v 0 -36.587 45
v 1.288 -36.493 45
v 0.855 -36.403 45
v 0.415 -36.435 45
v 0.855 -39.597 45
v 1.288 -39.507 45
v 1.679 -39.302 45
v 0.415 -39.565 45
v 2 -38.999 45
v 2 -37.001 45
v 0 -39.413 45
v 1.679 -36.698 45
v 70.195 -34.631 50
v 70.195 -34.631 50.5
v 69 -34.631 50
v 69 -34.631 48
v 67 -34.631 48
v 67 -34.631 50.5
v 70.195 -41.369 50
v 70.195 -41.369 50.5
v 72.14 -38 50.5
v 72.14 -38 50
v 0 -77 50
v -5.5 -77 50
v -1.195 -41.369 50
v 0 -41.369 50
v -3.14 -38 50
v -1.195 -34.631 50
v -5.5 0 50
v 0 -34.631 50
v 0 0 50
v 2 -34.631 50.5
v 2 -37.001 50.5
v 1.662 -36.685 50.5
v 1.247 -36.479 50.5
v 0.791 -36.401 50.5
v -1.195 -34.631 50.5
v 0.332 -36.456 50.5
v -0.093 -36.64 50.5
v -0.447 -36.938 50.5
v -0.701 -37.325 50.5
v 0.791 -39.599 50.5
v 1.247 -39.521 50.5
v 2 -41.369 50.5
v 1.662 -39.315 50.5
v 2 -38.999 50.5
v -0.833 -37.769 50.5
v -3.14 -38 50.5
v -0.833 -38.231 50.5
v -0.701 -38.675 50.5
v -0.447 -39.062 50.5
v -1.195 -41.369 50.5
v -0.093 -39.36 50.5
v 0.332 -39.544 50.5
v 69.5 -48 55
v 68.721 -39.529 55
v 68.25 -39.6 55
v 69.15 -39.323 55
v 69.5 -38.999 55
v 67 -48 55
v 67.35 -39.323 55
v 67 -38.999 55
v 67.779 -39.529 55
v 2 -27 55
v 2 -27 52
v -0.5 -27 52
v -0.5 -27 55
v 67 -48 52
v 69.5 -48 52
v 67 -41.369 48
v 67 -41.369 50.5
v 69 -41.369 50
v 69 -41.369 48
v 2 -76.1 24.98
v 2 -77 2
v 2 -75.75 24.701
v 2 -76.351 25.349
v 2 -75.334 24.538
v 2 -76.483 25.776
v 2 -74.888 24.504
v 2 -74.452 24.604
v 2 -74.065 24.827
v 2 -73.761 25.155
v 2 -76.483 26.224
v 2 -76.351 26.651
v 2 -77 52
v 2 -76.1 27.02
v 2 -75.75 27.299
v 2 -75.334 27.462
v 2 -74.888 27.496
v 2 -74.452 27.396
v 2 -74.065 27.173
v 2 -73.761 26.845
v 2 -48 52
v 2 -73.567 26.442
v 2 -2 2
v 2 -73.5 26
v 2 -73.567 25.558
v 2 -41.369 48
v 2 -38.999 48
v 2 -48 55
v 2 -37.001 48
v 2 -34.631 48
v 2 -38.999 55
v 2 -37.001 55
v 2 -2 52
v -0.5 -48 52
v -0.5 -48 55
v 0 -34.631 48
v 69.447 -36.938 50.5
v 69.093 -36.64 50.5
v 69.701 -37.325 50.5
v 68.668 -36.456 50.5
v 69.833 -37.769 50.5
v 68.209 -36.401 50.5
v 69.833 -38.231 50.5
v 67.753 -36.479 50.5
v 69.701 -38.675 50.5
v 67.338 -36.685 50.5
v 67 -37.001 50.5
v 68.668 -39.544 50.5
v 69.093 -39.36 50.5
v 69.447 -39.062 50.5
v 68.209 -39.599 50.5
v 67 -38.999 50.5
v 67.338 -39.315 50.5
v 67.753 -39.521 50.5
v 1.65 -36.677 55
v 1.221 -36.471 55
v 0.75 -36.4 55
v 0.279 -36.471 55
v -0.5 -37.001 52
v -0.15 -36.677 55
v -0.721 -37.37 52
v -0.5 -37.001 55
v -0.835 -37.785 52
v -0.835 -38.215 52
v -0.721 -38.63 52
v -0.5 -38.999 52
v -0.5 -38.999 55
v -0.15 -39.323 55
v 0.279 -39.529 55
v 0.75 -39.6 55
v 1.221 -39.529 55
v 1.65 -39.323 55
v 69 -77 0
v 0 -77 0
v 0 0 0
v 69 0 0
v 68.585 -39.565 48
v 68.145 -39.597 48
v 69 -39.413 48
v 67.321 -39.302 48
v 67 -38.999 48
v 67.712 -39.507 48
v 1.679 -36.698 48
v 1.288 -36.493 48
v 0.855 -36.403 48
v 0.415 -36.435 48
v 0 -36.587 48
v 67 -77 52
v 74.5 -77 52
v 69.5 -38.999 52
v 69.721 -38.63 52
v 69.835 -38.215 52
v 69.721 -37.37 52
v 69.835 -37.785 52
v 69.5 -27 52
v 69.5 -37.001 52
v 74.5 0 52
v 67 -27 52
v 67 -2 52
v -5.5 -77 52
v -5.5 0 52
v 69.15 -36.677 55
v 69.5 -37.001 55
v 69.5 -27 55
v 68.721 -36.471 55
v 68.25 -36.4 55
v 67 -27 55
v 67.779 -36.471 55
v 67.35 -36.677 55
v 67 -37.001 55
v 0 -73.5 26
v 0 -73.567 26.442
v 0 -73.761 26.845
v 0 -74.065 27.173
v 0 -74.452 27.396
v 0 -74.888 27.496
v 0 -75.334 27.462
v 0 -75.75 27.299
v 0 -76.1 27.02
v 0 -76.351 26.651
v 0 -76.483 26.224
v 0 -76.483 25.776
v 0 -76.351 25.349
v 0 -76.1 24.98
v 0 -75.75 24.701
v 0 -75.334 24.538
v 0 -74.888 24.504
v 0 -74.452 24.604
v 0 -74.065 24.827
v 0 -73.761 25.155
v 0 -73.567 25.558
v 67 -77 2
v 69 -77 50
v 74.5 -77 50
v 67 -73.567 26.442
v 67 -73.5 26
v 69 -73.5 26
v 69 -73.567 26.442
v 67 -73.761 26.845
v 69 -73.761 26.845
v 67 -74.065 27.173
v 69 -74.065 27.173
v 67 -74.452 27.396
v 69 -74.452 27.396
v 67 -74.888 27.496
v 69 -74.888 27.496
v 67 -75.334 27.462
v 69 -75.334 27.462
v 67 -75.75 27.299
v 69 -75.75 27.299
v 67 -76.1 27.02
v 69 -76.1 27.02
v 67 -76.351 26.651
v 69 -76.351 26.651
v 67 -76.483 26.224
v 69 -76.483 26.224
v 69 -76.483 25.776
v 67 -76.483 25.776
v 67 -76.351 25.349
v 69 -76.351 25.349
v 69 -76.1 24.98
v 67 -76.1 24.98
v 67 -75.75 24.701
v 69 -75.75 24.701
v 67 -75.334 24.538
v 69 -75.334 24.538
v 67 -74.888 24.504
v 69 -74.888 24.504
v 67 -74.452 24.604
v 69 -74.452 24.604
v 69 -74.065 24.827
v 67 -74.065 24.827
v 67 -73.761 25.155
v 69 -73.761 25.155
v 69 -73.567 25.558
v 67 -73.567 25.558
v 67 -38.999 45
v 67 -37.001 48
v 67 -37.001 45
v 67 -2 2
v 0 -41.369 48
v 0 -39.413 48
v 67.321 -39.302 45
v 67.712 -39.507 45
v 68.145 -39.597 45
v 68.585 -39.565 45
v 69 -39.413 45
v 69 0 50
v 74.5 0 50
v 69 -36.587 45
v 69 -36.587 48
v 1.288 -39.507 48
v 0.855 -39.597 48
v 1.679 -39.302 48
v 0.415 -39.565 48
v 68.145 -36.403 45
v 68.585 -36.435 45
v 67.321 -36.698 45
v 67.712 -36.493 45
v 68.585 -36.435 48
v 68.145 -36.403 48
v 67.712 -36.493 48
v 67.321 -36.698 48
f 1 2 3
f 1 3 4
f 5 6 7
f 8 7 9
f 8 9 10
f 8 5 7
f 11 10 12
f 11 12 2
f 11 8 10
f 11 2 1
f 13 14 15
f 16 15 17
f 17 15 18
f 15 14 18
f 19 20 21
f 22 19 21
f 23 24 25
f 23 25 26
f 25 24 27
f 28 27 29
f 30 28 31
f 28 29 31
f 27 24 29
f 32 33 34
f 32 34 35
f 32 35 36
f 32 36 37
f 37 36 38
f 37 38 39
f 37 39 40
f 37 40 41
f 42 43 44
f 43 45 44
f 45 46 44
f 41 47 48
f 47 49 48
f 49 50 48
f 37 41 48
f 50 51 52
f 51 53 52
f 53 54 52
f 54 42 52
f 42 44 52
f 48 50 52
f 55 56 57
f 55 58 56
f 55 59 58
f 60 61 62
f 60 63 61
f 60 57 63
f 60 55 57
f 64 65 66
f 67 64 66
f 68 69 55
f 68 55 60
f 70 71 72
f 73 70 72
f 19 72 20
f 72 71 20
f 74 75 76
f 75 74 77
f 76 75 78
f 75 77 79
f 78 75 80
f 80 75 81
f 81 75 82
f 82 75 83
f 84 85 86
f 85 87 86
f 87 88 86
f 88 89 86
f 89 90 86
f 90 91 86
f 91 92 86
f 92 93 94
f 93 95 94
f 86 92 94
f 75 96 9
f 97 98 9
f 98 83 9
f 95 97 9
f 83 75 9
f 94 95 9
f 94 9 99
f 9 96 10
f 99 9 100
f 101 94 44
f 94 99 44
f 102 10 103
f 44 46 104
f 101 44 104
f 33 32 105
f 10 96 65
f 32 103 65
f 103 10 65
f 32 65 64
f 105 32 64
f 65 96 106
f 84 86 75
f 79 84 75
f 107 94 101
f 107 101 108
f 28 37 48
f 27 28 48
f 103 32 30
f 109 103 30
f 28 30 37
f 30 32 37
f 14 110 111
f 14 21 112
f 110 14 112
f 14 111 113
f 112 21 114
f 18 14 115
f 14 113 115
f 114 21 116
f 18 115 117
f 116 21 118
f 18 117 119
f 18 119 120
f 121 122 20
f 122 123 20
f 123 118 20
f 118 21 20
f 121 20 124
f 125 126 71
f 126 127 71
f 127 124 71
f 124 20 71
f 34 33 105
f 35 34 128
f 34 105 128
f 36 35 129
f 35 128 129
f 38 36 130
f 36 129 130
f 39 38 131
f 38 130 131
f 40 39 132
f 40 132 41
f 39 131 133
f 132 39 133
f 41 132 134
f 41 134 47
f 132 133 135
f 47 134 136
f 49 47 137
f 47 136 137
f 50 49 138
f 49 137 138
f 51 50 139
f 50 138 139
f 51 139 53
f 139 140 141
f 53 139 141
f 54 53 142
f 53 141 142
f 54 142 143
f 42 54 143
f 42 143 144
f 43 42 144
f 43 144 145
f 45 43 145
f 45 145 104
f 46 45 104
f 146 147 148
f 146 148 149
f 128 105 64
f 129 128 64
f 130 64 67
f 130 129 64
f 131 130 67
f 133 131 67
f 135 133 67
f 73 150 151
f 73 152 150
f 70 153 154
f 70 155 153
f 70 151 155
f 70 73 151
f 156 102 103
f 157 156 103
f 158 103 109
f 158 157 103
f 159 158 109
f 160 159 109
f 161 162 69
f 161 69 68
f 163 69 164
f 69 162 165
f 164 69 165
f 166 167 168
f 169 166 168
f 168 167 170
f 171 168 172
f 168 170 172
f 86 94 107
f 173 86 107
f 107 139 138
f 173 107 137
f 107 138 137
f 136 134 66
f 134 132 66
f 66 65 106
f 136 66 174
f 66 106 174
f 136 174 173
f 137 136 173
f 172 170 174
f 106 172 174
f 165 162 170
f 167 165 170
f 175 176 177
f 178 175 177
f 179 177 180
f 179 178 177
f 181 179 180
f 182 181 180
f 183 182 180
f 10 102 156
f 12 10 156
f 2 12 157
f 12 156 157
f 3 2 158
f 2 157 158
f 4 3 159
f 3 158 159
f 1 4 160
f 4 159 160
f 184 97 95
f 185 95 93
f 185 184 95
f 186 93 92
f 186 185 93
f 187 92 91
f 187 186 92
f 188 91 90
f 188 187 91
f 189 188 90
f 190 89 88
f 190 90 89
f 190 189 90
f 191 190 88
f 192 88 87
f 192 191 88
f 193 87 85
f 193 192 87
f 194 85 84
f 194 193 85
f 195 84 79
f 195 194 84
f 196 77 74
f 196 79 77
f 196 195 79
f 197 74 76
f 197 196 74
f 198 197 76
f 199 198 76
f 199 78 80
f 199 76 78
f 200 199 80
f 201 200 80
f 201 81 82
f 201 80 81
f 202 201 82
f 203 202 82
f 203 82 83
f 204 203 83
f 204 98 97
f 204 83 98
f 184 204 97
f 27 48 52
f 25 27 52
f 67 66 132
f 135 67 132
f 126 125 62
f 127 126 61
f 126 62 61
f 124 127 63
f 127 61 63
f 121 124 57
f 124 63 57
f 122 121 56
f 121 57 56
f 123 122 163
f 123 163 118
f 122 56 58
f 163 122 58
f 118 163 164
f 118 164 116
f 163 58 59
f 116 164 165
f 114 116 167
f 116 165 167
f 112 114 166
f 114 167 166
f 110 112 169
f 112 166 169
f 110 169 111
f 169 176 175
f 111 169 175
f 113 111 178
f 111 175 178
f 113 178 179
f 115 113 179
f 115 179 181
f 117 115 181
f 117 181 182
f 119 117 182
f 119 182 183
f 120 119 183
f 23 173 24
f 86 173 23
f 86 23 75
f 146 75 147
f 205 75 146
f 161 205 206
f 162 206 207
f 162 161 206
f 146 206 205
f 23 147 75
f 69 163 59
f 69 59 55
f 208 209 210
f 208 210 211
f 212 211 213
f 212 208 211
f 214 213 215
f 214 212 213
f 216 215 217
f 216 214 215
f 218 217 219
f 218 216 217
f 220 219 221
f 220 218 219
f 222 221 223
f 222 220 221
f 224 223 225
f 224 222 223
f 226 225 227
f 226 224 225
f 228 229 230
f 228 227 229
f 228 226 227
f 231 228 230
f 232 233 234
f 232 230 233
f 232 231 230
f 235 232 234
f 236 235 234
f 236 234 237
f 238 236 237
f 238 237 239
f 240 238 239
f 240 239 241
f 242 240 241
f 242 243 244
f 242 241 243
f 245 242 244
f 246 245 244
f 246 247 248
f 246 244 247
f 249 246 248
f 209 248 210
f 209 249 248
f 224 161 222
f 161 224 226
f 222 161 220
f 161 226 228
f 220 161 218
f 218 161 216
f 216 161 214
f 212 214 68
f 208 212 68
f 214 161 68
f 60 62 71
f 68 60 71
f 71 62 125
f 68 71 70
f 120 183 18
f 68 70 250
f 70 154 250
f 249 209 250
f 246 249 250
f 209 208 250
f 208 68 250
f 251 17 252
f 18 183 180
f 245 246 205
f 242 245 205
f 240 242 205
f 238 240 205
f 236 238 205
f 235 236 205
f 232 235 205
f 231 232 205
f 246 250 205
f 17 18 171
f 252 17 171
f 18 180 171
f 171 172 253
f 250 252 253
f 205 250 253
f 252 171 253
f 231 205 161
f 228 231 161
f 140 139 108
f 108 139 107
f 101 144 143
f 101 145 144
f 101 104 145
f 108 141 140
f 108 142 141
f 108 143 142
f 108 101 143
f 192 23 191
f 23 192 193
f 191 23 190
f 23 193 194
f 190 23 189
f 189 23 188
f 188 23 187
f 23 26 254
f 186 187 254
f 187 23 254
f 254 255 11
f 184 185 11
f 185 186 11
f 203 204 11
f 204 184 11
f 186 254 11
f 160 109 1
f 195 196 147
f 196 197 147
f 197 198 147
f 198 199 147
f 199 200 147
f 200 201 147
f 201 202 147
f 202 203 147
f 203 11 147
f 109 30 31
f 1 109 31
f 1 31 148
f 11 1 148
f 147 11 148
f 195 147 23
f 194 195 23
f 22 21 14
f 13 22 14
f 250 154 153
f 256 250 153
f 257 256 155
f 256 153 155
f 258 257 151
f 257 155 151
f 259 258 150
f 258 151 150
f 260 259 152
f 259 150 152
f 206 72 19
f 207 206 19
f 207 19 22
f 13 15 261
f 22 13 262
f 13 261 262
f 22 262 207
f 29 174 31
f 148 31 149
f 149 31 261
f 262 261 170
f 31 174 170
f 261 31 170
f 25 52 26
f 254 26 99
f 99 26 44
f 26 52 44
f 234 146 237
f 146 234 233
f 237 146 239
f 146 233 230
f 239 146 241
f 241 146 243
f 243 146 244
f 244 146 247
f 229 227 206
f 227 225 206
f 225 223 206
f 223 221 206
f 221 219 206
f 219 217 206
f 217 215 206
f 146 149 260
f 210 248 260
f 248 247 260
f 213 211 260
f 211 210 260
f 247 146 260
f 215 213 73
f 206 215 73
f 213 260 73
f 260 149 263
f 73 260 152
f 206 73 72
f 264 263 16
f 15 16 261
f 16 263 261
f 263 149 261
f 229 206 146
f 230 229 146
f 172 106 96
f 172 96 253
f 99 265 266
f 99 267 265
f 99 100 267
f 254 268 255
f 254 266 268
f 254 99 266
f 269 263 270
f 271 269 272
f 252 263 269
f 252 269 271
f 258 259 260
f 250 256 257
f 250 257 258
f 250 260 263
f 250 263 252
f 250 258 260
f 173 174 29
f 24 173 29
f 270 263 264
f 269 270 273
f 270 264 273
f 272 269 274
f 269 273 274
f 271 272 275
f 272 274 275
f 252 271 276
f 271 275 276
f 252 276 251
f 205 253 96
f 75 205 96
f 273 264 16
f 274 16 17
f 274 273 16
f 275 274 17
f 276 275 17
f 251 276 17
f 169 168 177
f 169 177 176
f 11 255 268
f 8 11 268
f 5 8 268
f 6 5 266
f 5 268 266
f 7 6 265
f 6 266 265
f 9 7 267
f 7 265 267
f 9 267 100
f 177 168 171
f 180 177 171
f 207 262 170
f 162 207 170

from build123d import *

# Parameters (mm, degrees)
PAD_DEPTH         = 77
SKETCH001_W       = 69
SKETCH001_H       = 52
PAD001_DEPTH      = 2
SKETCH002_R       = 1.5
POCKET_DEPTH      = 5.501
POCKET_DEPTH_BACK = -74.501
SKETCH003_W       = 2.5
SKETCH003_H       = 21
PAD002_DEPTH      = 3
SKETCH004_R       = 1.6
POCKET001_DEPTH   = 10
POCKET002_DEPTH   = 2.5


with BuildPart() as part:
    # Sketch → Pad (new body)
    with BuildSketch(Plane.XZ):
        Polygon((0, 0), (69, 0), (69, 50), (74.5, 50), (74.5, 52), (67, 52), (67, 2), (2, 2), (2, 52), (-5.5, 52), (-5.5, 50), (0, 50), align=None)
    extrude(amount=PAD_DEPTH)

    # Sketch001 → Pad001 (join)
    with BuildSketch(Plane.XZ):
        with Locations((34.5, 26)):
            Rectangle(SKETCH001_W, SKETCH001_H)
    extrude(amount=PAD001_DEPTH)

    # Sketch002 → Pocket (cut, two sides)
    with BuildSketch(Plane.YZ) as pocket_sk:
        with Locations((-75, 26)):
            Circle(SKETCH002_R)
    extrude(amount=-POCKET_DEPTH, mode=Mode.SUBTRACT)
    extrude(pocket_sk.sketch, amount=-POCKET_DEPTH_BACK, mode=Mode.SUBTRACT)

    # Sketch003 (on Face8 of Pocket) → Pad002 (join)
    with BuildSketch(Plane(origin=(0, 0, 52), x_dir=(-1, 0, 0), z_dir=(0, 0, 1))):
        with Locations((-68.25, 37.5)):
            Rectangle(SKETCH003_W, SKETCH003_H)
        with Locations((-0.75, 37.5)):
            Rectangle(SKETCH003_W, SKETCH003_H)
    extrude(amount=PAD002_DEPTH)

    # Sketch004 (on Face21 of Pad002) → Pocket001 (cut)
    with BuildSketch(Plane(origin=(0, 0, 55), x_dir=(-1, 0, 0), z_dir=(0, 0, 1))):
        with Locations((-68.25, 38)):
            Circle(SKETCH004_R)
        with Locations((-0.75, 38)):
            Circle(SKETCH004_R)
    extrude(amount=-POCKET001_DEPTH, mode=Mode.SUBTRACT)

    # Sketch005 (on Face11 of Pocket001) → Pocket002 (cut)
    with BuildSketch(Plane(origin=(0, 0, 50.5), x_dir=(-1, 0, 0), z_dir=(0, 0, 1))):
        Polygon((1.195, 34.631161), (3.14, 38), (1.195, 41.368839), (-2.695, 41.368839), (-4.64, 38), (-2.695, 34.631161), align=None)
        Polygon((-66.305, 34.631161), (-64.36, 38), (-66.305, 41.368839), (-70.195, 41.368839), (-72.14, 38), (-70.195, 34.631161), align=None)
    extrude(amount=-POCKET002_DEPTH, mode=Mode.SUBTRACT)


solid = part.part
